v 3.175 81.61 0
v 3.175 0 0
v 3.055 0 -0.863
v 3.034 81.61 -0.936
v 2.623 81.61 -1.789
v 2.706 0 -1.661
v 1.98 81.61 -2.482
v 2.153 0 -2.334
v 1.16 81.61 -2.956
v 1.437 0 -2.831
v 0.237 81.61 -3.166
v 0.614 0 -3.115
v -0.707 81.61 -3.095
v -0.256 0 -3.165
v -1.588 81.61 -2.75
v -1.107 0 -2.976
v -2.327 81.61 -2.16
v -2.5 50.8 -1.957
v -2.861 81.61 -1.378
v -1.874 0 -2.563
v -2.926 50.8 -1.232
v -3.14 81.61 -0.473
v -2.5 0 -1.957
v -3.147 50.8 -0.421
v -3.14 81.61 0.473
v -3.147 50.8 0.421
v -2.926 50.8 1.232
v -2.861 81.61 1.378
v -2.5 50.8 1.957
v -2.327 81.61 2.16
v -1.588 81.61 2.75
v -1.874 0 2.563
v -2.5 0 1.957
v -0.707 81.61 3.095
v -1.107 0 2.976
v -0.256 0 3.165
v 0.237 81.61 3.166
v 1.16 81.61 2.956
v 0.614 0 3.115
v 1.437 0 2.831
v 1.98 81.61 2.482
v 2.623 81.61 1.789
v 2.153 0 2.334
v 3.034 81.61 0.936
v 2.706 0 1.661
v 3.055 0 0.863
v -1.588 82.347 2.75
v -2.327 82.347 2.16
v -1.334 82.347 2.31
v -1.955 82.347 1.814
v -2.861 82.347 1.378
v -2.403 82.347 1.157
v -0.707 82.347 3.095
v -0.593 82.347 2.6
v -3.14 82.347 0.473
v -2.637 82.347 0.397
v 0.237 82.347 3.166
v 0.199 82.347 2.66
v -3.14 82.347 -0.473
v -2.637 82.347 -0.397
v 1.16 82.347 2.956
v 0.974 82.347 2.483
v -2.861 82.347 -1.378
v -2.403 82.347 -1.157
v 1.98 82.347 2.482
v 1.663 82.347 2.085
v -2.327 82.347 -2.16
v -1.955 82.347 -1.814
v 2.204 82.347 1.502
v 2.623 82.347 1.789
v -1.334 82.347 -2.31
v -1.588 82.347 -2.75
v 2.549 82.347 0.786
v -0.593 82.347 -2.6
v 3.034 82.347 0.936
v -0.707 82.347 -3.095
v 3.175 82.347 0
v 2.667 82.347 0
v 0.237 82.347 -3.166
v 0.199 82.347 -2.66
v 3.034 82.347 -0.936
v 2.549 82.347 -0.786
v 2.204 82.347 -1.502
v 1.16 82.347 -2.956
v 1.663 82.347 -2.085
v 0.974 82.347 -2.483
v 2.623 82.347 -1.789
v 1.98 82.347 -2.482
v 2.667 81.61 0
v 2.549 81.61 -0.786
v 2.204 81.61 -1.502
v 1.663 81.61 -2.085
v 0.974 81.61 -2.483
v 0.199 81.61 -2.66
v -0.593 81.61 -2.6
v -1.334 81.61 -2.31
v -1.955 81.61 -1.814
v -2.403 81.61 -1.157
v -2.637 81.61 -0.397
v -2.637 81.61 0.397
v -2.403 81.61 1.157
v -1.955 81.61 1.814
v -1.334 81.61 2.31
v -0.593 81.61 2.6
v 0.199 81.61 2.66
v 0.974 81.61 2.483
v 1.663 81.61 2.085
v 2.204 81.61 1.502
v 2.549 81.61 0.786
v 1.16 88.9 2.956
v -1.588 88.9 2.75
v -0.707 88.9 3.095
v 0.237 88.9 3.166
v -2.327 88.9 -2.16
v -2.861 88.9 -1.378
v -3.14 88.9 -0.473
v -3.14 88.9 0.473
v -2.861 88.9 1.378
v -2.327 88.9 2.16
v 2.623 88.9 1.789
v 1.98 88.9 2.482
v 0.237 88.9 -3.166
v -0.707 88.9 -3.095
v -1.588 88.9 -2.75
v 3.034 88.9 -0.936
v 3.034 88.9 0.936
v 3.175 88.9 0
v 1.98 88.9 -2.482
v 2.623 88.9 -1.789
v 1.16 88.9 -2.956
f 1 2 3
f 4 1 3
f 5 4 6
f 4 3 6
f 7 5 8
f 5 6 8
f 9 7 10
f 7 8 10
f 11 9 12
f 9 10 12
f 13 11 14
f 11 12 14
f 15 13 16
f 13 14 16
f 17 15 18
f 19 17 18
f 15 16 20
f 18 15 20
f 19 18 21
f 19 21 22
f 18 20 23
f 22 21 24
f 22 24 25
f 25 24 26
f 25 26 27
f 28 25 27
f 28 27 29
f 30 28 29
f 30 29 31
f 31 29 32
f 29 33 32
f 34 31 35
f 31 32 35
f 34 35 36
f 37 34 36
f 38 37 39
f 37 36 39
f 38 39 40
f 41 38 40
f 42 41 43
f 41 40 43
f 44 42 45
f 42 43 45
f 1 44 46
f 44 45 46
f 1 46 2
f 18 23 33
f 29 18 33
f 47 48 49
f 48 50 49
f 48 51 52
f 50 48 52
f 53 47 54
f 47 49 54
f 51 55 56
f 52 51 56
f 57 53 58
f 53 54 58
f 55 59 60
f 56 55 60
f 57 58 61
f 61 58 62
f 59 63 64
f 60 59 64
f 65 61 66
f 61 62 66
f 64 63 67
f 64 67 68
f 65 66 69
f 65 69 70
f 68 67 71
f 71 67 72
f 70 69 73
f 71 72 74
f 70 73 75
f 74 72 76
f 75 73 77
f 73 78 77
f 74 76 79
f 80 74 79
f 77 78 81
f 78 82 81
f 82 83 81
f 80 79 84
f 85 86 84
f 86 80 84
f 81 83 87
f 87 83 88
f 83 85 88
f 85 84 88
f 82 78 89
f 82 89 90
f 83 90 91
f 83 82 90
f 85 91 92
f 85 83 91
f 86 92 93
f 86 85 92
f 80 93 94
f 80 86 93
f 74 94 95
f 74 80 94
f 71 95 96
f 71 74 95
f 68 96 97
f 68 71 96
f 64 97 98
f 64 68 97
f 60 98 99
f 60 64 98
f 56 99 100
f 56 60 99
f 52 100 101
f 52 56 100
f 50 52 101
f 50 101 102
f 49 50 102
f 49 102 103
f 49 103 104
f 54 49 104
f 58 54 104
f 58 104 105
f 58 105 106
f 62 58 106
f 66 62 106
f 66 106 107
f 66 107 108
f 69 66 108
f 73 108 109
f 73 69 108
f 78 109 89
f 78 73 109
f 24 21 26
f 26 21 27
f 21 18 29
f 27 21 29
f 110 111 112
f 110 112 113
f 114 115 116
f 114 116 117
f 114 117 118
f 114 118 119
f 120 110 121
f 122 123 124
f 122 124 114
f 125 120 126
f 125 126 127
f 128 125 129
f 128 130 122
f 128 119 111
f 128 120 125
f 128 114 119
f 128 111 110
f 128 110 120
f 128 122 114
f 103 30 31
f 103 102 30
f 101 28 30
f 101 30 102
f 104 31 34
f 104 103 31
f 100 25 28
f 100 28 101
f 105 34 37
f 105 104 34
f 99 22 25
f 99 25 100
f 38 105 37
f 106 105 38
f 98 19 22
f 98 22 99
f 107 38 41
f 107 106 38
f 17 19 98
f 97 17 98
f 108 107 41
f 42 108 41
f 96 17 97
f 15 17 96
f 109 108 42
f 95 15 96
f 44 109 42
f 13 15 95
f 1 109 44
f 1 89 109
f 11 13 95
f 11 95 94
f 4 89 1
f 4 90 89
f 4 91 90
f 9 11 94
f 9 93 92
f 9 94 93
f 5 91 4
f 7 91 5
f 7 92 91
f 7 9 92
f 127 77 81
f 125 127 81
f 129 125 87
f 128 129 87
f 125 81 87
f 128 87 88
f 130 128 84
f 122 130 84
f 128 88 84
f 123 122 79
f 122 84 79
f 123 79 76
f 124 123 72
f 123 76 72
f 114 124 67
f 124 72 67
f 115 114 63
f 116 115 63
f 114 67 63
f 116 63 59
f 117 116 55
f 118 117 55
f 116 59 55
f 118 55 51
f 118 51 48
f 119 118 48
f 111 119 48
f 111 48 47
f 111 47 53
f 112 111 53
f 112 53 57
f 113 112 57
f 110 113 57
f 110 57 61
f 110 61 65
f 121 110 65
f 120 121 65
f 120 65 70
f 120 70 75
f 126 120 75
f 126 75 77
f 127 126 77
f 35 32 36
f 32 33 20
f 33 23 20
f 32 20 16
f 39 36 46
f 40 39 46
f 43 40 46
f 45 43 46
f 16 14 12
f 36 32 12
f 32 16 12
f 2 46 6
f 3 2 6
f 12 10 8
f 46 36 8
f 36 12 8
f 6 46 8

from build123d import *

# Parameters (mm, degrees)
SKETCH1_R           = 3.175
BOSS_EXTRUDE1_DEPTH = 88.9
CUT_EXTRUDE1_DEPTH  = 50.8
CUT_EXTRUDE2_START  = -6.5532
SKETCH3_R           = 3.175
SKETCH3_R_2         = 2.667
CUT_EXTRUDE2_DEPTH  = 0.7366


with BuildPart() as part:
    # Sketch1 → Boss-Extrude1 (new body)
    with BuildSketch(Plane(origin=(0, 0, 0), x_dir=(1, 0, 0), z_dir=(0, 1, 0))):
        Circle(SKETCH1_R)
    extrude(amount=BOSS_EXTRUDE1_DEPTH)

    # Sketch2 → Cut-Extrude1 (cut)
    with BuildSketch(Plane.XZ):
        Polygon((-2.5, 0), (-2.5, -1.957198253), (-3.175, -1.957198253), (-3.175, 1.957198253), (-2.5, 1.957198253), align=None)
    extrude(amount=-CUT_EXTRUDE1_DEPTH, mode=Mode.SUBTRACT)

    # Sketch3 → Cut-Extrude2 (cut)
    with BuildSketch(Plane(origin=(0, 88.9, 0), x_dir=(1, 0, 0), z_dir=(0, 1, 0)).offset(CUT_EXTRUDE2_START)):
        Circle(SKETCH3_R)
        Circle(SKETCH3_R_2, mode=Mode.SUBTRACT)
    extrude(amount=-CUT_EXTRUDE2_DEPTH, mode=Mode.SUBTRACT)


solid = part.part
